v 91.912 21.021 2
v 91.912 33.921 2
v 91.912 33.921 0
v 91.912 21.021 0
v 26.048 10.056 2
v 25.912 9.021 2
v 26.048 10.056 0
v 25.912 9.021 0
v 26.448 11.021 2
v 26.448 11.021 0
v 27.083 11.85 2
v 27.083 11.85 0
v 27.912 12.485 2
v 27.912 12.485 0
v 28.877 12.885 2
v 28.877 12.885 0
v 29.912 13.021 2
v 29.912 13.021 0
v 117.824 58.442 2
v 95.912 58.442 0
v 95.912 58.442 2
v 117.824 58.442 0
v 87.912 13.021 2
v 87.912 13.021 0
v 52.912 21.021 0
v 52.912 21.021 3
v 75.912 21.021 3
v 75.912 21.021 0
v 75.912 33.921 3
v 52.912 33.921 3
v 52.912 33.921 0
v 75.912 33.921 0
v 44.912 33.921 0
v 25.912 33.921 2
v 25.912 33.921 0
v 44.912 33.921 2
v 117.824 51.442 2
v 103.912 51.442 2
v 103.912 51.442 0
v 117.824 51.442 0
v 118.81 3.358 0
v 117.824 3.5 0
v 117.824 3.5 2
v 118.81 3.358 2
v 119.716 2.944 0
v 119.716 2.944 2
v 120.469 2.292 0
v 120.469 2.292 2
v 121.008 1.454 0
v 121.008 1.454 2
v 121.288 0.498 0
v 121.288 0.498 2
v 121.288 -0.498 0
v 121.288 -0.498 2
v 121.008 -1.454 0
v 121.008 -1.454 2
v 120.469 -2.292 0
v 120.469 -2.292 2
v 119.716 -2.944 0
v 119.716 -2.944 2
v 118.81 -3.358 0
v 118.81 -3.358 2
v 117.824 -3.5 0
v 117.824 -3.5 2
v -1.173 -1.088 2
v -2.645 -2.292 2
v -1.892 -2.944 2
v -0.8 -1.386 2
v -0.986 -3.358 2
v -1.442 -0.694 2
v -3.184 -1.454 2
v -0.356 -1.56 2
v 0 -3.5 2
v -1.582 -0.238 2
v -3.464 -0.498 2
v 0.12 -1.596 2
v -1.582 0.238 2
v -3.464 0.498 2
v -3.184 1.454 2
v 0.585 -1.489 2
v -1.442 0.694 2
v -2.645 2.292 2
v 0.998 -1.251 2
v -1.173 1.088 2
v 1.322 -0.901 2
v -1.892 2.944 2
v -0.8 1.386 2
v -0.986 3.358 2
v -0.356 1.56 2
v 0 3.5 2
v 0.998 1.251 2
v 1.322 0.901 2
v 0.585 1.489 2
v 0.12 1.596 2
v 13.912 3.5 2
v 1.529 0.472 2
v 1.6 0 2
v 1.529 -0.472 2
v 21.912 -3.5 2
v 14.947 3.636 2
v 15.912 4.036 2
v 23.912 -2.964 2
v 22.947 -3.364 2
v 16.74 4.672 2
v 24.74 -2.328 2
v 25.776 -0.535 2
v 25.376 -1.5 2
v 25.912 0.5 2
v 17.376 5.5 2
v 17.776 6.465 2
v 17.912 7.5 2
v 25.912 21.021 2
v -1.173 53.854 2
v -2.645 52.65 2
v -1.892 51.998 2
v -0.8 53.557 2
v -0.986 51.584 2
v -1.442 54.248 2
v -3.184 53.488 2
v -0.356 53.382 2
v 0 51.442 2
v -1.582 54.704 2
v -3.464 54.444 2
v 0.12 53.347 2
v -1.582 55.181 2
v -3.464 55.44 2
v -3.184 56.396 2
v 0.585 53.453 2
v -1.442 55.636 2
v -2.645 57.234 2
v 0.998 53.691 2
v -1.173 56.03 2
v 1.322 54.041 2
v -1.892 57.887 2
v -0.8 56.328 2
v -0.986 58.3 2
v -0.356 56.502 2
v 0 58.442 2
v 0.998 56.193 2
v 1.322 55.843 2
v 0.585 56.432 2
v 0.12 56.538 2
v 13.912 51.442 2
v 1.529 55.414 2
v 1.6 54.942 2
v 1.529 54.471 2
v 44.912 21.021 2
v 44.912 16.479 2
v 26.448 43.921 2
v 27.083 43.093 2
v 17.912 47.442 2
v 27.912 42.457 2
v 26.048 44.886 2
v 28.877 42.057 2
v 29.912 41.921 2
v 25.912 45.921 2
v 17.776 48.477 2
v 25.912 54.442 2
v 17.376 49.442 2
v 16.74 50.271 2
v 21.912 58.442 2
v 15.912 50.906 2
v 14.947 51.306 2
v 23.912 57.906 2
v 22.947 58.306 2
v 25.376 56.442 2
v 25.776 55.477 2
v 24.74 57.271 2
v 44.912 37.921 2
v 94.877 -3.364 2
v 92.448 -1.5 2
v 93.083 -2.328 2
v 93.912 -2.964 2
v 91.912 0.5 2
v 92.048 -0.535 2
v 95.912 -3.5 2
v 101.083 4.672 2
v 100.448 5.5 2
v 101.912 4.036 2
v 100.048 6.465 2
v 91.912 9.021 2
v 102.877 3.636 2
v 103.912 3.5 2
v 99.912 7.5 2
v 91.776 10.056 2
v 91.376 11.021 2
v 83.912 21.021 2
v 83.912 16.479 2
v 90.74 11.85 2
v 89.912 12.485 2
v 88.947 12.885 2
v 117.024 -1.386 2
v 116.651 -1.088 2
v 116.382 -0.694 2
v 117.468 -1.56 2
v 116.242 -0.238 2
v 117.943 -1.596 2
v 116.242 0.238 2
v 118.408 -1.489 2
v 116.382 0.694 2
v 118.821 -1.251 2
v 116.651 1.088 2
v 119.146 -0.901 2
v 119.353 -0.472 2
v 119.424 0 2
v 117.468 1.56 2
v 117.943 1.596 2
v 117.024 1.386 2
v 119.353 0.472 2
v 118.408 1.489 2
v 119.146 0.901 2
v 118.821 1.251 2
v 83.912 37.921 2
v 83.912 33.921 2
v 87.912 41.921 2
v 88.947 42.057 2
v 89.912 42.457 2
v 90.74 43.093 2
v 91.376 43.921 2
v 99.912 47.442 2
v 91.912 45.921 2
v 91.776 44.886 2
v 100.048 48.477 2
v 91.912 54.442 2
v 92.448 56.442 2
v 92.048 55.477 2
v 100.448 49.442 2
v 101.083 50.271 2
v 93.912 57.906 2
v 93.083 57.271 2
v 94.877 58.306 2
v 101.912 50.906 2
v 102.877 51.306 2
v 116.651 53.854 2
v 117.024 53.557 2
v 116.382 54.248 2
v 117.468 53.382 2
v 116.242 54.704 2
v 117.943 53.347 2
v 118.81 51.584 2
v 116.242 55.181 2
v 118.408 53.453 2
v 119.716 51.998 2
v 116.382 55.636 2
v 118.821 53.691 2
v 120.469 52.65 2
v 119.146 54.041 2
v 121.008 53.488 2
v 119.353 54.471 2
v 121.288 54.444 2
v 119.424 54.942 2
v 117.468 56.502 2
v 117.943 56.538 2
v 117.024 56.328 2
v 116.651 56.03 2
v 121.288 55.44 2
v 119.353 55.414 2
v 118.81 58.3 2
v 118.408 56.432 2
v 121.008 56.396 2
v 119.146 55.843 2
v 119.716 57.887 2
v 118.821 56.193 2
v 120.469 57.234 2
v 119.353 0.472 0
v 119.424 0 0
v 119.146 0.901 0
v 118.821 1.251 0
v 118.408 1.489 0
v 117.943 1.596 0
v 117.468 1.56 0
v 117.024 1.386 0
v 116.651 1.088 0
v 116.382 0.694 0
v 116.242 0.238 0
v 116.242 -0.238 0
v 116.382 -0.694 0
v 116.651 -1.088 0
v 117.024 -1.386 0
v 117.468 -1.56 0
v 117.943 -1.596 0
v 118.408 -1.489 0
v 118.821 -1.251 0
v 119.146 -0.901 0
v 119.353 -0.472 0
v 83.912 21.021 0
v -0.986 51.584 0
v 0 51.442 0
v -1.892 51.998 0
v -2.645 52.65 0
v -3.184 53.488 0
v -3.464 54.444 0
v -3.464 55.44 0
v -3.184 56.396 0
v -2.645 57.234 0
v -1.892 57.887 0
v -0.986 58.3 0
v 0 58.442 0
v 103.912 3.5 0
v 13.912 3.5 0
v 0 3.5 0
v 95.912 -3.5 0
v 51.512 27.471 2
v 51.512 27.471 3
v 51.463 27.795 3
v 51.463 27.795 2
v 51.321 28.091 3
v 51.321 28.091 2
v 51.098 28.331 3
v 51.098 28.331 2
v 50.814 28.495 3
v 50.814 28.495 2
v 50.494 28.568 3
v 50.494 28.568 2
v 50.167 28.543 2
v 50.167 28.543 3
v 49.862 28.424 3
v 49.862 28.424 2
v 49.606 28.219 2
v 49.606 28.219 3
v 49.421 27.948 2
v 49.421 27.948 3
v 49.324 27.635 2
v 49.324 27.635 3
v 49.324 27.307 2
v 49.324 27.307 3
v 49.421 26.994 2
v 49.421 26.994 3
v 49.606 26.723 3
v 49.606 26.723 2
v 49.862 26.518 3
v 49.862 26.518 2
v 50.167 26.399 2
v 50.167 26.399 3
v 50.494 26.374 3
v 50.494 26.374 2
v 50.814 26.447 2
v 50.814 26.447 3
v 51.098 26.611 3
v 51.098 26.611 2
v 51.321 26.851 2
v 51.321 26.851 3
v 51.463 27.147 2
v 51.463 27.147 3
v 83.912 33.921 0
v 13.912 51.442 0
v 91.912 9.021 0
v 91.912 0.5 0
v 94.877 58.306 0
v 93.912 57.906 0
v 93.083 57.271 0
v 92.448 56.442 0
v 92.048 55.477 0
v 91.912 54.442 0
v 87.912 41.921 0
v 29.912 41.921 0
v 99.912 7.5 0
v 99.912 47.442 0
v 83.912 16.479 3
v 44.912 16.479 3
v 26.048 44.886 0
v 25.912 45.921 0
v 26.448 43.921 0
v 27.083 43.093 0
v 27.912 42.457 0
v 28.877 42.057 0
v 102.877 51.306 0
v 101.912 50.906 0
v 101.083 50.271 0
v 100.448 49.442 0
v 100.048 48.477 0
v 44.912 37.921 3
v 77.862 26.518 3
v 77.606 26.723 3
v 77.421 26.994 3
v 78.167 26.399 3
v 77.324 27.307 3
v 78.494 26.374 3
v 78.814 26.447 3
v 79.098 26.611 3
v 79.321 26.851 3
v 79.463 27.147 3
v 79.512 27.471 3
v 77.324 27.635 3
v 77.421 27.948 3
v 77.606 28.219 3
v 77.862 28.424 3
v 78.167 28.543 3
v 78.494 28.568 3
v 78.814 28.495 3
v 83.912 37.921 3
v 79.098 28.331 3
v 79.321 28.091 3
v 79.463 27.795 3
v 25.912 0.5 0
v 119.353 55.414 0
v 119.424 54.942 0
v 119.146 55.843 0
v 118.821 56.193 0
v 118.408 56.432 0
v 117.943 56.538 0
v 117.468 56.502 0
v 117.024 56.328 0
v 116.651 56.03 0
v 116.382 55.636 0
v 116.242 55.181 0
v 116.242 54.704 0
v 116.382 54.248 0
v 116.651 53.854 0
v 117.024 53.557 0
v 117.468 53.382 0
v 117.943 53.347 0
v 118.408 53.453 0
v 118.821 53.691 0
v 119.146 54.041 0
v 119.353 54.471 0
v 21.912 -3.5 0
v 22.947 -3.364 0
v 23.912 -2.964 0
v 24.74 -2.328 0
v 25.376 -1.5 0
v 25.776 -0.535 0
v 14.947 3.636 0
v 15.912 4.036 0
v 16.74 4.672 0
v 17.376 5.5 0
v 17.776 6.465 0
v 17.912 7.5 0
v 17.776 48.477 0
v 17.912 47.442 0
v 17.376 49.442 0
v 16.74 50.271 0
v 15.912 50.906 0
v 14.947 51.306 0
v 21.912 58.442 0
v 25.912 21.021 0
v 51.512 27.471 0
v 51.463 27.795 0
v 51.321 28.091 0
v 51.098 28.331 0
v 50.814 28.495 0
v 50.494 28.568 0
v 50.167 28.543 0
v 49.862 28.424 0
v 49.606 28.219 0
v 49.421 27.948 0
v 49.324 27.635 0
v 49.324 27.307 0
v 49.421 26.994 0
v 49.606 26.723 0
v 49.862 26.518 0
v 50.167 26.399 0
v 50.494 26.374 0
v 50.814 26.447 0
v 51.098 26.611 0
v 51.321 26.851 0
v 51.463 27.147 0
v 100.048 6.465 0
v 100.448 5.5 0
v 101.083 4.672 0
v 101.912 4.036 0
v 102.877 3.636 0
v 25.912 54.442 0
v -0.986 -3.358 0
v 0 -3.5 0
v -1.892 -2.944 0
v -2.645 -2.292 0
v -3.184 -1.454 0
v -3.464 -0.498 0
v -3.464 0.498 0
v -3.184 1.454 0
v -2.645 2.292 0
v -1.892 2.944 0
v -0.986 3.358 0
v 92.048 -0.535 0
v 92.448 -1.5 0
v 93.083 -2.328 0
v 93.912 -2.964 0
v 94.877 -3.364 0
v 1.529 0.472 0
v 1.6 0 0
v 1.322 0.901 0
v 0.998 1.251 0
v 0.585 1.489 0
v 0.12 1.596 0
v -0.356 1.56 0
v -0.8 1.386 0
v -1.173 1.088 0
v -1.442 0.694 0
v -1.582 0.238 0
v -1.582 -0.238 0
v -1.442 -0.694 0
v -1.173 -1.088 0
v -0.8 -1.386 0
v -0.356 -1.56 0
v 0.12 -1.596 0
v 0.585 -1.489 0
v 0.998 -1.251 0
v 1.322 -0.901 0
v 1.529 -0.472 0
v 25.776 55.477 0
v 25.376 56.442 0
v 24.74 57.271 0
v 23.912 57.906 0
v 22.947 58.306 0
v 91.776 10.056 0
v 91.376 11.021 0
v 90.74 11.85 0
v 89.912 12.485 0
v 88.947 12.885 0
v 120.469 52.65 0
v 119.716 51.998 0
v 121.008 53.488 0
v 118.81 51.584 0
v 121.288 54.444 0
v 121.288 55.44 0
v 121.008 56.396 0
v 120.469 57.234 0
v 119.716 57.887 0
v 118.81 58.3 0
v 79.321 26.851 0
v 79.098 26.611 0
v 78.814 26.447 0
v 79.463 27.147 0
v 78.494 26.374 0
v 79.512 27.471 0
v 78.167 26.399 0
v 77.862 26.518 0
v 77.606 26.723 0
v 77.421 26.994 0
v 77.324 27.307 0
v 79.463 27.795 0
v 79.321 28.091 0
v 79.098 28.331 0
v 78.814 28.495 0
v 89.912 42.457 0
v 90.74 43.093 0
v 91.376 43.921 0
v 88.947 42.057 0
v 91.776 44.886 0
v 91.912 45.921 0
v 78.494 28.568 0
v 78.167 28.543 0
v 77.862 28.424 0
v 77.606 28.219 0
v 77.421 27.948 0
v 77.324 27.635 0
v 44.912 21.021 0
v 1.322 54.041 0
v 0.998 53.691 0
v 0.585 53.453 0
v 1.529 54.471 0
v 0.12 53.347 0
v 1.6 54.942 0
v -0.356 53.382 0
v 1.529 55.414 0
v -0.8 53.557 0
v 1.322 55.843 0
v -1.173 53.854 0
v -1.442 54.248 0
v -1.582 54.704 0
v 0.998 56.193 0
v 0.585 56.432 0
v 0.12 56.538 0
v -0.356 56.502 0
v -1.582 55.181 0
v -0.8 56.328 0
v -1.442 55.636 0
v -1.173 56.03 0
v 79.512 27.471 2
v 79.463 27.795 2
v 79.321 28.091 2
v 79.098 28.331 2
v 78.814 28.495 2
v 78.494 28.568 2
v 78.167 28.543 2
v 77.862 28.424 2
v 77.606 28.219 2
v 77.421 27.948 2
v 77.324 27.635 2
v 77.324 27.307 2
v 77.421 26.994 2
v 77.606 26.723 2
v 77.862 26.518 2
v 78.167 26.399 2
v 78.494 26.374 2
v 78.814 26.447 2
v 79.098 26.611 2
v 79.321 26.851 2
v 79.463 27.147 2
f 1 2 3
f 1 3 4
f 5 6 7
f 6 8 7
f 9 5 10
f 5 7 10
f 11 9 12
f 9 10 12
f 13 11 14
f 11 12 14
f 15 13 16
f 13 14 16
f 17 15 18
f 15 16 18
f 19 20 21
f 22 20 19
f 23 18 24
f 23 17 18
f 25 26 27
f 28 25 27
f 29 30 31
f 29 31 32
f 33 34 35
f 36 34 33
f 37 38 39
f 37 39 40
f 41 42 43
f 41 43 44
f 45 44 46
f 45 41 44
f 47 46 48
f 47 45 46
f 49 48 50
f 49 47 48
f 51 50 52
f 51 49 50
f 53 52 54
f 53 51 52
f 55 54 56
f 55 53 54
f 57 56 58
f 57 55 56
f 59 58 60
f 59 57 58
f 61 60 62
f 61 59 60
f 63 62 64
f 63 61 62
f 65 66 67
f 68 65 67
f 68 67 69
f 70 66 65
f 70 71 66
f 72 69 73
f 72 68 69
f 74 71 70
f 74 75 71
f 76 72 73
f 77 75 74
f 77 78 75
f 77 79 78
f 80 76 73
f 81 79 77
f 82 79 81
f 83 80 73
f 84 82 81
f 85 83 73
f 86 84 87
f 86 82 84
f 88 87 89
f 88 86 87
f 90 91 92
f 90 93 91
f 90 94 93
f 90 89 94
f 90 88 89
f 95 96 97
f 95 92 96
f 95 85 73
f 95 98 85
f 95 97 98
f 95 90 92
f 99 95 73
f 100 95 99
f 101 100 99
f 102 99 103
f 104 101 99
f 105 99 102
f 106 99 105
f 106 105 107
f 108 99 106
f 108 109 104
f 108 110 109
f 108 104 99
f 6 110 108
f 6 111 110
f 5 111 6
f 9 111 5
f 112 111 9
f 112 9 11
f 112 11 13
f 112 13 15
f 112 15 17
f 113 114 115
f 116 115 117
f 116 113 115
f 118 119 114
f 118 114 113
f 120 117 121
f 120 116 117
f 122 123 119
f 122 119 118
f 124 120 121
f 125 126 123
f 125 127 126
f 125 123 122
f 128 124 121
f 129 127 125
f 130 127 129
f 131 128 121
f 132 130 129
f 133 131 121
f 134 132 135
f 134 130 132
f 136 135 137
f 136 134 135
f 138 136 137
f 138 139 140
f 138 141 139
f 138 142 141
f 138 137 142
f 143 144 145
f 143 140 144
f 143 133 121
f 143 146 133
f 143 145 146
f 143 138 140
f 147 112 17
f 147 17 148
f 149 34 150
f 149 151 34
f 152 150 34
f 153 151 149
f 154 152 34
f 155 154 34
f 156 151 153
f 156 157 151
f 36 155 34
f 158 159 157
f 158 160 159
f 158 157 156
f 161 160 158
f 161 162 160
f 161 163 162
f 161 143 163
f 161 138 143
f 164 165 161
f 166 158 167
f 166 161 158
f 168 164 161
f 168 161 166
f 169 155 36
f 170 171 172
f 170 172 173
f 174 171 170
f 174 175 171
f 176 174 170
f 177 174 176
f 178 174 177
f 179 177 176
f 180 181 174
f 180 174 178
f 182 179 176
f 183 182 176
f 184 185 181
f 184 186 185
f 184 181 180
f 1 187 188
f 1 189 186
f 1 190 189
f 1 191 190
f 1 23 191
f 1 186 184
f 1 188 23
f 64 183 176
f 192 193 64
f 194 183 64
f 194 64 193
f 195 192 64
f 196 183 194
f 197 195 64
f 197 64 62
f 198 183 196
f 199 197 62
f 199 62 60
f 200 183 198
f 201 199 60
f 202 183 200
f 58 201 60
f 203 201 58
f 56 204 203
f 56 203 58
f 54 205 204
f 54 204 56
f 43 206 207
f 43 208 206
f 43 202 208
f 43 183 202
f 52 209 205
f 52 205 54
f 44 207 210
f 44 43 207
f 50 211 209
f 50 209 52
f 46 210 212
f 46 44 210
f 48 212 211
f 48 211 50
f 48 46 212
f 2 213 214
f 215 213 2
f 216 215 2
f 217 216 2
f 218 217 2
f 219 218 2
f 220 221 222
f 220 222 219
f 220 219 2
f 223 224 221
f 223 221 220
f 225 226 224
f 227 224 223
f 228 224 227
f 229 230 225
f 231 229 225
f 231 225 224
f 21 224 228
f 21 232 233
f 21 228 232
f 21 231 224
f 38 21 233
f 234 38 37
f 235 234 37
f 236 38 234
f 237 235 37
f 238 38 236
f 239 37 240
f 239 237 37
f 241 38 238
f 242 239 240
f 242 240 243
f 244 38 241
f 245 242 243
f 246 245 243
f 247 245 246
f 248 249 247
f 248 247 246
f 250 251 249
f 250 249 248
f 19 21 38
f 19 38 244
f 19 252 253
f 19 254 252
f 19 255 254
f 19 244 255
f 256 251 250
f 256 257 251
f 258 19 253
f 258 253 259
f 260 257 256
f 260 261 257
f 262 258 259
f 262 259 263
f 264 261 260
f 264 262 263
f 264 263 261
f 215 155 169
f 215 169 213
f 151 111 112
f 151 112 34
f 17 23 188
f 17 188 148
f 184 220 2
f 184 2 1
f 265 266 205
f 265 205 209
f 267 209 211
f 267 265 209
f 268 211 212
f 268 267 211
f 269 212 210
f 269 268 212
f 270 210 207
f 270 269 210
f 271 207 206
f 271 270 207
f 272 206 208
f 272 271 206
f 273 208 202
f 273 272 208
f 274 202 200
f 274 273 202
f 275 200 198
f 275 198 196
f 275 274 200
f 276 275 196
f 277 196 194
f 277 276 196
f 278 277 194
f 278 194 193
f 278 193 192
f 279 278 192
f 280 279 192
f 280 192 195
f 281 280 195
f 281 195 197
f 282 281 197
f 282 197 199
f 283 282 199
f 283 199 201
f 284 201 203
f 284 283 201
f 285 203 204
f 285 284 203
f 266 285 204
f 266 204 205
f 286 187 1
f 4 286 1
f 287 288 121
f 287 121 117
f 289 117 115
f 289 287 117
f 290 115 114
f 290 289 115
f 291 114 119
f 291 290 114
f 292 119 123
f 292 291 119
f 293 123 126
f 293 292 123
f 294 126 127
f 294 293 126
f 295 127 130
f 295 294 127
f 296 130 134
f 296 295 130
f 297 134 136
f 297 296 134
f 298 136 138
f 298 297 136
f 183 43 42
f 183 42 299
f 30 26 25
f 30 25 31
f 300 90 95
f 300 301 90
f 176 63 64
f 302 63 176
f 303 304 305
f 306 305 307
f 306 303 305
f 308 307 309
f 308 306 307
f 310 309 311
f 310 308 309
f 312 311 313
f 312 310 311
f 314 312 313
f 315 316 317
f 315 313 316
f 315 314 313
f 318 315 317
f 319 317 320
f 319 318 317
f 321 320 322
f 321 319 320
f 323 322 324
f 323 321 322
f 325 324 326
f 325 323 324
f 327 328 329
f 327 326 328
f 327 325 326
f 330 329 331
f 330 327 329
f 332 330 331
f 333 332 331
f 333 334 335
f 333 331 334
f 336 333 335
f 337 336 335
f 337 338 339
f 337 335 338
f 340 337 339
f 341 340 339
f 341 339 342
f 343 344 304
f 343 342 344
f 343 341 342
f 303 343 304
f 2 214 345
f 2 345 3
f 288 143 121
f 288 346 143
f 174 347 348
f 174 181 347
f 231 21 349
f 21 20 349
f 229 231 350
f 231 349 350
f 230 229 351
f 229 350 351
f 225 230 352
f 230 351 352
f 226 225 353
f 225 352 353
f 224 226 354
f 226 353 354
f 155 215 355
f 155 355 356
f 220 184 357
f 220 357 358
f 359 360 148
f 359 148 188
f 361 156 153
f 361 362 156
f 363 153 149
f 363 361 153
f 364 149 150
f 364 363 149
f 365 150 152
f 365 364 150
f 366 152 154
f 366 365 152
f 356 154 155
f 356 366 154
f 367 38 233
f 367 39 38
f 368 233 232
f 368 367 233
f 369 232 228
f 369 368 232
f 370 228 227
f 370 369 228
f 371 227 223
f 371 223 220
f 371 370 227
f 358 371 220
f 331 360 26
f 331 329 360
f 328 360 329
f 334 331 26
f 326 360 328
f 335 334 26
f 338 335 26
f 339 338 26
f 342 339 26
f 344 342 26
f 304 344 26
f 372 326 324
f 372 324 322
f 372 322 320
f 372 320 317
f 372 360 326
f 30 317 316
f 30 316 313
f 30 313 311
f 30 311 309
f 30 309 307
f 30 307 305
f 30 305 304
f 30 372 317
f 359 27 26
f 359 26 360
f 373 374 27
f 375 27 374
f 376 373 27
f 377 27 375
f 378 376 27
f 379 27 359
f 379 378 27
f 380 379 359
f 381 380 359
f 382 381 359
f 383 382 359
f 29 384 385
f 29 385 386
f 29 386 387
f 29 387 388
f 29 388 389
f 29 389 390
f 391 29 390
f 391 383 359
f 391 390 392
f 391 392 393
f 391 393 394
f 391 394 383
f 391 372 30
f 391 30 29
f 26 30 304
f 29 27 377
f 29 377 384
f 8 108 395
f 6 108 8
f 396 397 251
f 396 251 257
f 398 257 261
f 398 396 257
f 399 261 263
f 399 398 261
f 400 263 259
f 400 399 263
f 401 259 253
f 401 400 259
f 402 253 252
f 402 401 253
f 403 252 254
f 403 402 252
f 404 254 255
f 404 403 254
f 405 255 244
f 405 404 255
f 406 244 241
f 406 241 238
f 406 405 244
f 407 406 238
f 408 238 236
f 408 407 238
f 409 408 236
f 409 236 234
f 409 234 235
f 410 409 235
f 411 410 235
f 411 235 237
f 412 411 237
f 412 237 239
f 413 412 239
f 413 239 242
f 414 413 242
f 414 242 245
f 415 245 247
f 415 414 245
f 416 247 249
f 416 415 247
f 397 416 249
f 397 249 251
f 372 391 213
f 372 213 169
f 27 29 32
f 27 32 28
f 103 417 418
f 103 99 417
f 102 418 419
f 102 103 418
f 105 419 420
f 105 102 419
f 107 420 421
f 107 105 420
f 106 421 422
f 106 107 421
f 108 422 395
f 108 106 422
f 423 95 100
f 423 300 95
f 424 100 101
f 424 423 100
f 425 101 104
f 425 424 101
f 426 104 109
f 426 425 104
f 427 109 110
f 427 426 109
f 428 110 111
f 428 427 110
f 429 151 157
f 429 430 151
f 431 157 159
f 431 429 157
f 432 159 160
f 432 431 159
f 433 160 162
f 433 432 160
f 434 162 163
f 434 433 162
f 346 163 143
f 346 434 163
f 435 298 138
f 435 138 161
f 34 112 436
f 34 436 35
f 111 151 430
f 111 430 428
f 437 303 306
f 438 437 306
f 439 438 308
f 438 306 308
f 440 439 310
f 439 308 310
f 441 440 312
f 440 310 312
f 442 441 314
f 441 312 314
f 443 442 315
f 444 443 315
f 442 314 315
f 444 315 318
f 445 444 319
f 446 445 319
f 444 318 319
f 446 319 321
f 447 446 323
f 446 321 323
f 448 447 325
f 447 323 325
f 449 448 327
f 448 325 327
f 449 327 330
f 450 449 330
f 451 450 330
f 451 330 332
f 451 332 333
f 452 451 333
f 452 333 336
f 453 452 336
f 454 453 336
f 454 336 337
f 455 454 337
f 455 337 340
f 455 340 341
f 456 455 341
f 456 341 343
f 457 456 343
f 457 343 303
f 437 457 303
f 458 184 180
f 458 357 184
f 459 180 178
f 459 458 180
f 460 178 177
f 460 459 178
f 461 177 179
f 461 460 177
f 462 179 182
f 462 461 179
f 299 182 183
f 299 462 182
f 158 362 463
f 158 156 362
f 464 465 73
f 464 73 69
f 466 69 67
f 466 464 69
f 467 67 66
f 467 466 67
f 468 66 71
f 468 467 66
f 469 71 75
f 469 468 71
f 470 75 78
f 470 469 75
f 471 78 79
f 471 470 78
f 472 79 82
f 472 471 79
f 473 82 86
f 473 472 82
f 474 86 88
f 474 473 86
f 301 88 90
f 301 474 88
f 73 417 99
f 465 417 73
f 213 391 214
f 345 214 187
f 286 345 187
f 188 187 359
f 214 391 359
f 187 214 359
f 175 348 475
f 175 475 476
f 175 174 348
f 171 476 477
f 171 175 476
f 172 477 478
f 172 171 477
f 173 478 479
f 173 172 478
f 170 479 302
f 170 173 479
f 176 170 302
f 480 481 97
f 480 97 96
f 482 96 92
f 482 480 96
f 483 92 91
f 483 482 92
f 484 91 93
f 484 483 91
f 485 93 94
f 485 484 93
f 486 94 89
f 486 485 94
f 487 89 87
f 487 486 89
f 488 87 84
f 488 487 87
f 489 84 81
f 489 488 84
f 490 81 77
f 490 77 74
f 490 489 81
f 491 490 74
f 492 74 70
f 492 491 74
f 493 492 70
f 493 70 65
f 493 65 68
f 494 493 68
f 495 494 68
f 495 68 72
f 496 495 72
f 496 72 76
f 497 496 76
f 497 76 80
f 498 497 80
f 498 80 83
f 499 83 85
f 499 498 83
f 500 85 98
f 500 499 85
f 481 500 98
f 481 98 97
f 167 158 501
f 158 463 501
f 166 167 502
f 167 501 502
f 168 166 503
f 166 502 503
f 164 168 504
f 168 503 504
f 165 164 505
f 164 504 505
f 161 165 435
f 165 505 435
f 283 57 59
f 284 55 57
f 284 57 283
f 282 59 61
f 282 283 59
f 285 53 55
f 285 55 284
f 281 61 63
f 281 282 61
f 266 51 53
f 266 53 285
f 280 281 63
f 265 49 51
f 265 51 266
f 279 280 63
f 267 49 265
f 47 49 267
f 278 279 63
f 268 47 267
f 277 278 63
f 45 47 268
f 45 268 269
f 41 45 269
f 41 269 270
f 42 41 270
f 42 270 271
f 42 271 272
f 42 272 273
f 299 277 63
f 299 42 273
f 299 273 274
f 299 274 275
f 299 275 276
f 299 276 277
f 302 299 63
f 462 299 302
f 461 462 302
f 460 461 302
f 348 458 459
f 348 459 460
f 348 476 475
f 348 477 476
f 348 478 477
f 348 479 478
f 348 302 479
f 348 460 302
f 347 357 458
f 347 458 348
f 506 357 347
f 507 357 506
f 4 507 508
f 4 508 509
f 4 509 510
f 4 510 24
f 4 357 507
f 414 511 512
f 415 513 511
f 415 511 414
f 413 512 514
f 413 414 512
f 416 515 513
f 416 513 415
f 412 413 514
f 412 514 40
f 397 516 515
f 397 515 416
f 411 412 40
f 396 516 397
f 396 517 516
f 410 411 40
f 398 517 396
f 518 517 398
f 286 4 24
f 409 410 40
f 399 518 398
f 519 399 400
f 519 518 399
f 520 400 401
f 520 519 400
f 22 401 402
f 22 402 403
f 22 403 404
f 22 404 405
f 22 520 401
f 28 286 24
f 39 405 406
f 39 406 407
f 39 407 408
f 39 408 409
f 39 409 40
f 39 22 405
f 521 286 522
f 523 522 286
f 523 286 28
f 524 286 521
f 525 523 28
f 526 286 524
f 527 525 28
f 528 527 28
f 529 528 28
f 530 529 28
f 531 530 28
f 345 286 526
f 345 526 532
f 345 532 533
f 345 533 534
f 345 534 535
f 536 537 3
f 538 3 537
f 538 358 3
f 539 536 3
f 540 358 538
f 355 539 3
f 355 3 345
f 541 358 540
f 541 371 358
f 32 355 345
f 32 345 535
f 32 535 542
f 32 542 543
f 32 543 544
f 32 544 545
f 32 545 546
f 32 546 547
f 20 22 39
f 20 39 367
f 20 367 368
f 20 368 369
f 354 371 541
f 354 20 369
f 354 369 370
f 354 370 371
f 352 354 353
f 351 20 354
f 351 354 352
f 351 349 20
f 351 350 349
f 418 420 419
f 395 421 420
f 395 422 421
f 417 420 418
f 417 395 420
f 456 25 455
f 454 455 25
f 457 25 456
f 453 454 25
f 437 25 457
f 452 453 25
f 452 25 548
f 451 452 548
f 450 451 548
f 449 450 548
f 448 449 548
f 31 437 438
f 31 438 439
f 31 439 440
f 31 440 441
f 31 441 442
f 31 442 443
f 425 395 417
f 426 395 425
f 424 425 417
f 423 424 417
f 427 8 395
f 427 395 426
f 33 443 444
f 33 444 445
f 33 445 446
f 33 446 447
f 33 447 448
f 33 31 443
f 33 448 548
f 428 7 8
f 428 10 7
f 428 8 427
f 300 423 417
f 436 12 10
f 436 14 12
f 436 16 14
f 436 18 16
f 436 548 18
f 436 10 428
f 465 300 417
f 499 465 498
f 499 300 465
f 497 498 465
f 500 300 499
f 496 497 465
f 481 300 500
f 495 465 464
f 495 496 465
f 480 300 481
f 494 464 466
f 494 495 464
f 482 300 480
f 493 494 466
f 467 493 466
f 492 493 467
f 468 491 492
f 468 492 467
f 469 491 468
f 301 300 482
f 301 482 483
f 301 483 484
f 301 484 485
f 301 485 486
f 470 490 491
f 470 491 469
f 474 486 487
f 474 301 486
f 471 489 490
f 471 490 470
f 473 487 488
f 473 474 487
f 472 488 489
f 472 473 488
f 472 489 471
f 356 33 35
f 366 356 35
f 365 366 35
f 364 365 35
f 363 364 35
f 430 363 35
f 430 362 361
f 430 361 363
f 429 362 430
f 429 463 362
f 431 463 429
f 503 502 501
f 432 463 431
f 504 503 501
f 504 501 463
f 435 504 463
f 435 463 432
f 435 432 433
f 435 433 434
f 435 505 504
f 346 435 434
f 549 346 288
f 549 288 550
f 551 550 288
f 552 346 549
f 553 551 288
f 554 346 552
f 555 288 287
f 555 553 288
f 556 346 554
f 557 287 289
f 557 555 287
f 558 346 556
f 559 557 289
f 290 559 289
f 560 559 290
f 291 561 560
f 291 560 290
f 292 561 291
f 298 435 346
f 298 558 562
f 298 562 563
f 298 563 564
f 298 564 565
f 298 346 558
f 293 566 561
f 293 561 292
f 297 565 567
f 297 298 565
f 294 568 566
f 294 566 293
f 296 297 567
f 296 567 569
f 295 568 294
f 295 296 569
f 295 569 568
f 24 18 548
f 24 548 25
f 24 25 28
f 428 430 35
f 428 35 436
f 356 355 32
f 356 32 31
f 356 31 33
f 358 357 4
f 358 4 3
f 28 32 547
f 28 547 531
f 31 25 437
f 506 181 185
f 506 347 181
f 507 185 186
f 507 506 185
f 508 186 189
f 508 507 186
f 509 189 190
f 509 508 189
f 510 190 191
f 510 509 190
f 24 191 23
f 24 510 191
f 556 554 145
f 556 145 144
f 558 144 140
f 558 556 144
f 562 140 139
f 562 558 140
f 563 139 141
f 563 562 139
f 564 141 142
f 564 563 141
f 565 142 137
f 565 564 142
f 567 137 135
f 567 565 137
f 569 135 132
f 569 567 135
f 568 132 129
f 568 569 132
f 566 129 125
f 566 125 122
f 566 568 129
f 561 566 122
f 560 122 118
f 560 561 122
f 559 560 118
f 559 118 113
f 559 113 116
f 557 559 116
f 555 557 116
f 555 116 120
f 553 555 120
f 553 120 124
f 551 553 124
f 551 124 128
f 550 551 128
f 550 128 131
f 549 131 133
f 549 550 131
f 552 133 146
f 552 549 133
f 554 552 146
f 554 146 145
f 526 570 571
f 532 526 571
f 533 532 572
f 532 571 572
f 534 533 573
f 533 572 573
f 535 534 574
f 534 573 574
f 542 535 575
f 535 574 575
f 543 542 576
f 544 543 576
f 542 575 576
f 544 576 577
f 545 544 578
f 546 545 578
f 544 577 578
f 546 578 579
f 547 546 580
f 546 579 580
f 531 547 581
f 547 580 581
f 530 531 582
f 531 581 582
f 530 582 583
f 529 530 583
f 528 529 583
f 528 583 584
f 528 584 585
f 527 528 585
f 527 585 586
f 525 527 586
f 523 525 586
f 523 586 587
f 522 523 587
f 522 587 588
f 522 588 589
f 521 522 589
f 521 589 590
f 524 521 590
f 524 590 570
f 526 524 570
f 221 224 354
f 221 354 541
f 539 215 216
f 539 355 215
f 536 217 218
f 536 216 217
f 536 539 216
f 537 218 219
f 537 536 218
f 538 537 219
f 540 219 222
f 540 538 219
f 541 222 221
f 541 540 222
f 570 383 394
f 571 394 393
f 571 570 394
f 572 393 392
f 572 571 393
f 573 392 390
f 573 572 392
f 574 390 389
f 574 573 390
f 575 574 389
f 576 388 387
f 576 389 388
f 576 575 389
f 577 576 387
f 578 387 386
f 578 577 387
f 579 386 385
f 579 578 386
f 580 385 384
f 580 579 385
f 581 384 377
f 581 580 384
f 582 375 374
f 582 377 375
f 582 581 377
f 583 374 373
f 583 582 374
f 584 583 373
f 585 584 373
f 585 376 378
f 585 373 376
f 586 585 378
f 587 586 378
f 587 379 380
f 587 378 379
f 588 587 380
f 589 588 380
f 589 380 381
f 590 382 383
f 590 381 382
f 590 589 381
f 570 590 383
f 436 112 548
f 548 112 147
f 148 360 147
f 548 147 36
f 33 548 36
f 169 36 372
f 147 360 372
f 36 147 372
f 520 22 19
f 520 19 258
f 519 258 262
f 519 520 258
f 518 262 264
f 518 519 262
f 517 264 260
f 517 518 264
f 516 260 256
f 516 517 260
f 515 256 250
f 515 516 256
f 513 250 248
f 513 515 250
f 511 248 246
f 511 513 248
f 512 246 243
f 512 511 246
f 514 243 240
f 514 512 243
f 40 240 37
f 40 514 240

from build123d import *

# Parameters (mm, degrees)
SKETCH1_R                = 1.6
SKETCH1_R_2              = 2.1
BOSS_EXTRUDE3_DEPTH      = 2
BOSS_EXTRUDE4_DEPTH      = 2
SKETCH4_W                = 66
SKETCH4_H                = 16.340111315
SKETCH4_H_2              = 24.741581589
CUT_EXTRUDE3_DEPTH       = 14.5
FILLET1_R                = 4
SKETCH5_W                = 26
SKETCH5_H                = 27
SKETCH5_R                = 6
BOSS_EXTRUDE5_DEPTH      = 2
SKETCH6_W                = 5
SKETCH6_H                = 27
CUT_EXTRUDE4_DEPTH       = 14.5
SKETCH7_R                = 2.5
BOSS_EXTRUDE6_DEPTH      = 2
SKETCH8_R                = 2.5
CUT_EXTRUDE5_DEPTH       = 10
SKETCH9_W                = 22.081
SKETCH9_H                = 27
CUT_EXTRUDE6_DEPTH       = 10
CUT_EXTRUDE7_DEPTH       = 10
SKETCH11_W               = 28.061
SKETCH11_H               = 7.05
BOSS_EXTRUDE7_DEPTH      = 2
SKETCH12_W               = 44.061
SKETCH12_H               = 28.9
CUT_EXTRUDE9_DEPTH       = 10
BOSS_EXTRUDE9_DEPTH      = 2
FILLET2_R                = 4
SKETCH14_R               = 2.5
SKETCH14_W               = 28.061
SKETCH14_H               = 12.9
BOSS_EXTRUDE10_DEPTH     = 1
SKETCH15_W               = 3
SKETCH15_H               = 12.9
BOSS_EXTRUDE11_DEPTH     = 2.5
SKETCH16_W               = 3
SKETCH16_H               = 12.9
BOSS_EXTRUDE12_DEPTH     = 2.5
SKETCH17_W               = 6
SKETCH17_H               = 12.9
CUT_EXTRUDE12_DEPTH      = 5.5
BOSS_EXTRUDE13_DEPTH     = 3
CUT_EXTRUDE13_DEPTH      = 1
SKETCH21_W               = 0.081
SKETCH21_H               = 12.9
SKETCH21_W_2             = 4.98
CUT_EXTRUDE14_DEPTH      = 5.5
SKETCH22_R               = 2.5
BOSS_EXTRUDE14_DEPTH     = 3
SKETCH23_R               = 1.1
CUT_EXTRUDE17_DEPTH      = 5.5
CUT_EXTRUDE17_DEPTH_BACK = 5.5


with BuildPart() as part:
    # Sketch1 → Boss-Extrude3 (new body)
    with BuildSketch(Plane.XY):
        with BuildLine():
            Line((0, 3.5), (37.911912125, 3.5))
            Line((37.911912125, 3.5), (37.911912125, 13.97107578))
            Line((37.911912125, 13.97107578), (37.911912125, 40.97107578))
            Line((37.911912125, 40.97107578), (37.911912125, 51.44215156))
            Line((37.911912125, 51.44215156), (0, 51.44215156))
            ThreePointArc((0, 51.44215156), (-3.5, 54.94215156), (0, 58.44215156))
            Line((0, 58.44215156), (45.911912125, 58.44215156))
            Line((45.911912125, 58.44215156), (45.911912125, 51.44215156))
            Line((45.911912125, 51.44215156), (45.911912125, 48.97107578))
            Line((45.911912125, 48.97107578), (50.911912125, 48.97107578))
            Line((50.911912125, 48.97107578), (66.911912125, 48.97107578))
            Line((66.911912125, 48.97107578), (71.911912125, 48.97107578))
            Line((71.911912125, 48.97107578), (71.911912125, 51.44215156))
            Line((71.911912125, 51.44215156), (71.911912125, 58.44215156))
            Line((71.911912125, 58.44215156), (117.82382425, 58.44215156))
            ThreePointArc((117.82382425, 58.44215156), (121.32382425, 54.94215156), (117.82382425, 51.44215156))
            Line((117.82382425, 51.44215156), (79.911912125, 51.44215156))
            Line((79.911912125, 51.44215156), (79.911912125, 40.97107578))
            Line((79.911912125, 40.97107578), (79.911912125, 13.97107578))
            Line((79.911912125, 13.97107578), (79.911912125, 3.5))
            Line((79.911912125, 3.5), (117.82382425, 3.5))
            ThreePointArc((117.82382425, 3.5), (121.32382425, 0), (117.82382425, -3.5))
            Line((117.82382425, -3.5), (71.911912125, -3.5))
            Line((71.911912125, -3.5), (71.911912125, 3.5))
            Line((71.911912125, 3.5), (71.911912125, 5.97107578))
            Line((71.911912125, 5.97107578), (66.911912125, 5.97107578))
            Line((66.911912125, 5.97107578), (50.911912125, 5.97107578))
            Line((50.911912125, 5.97107578), (45.911912125, 5.97107578))
            Line((45.911912125, 5.97107578), (45.911912125, 3.5))
            Line((45.911912125, 3.5), (45.911912125, -3.5))
            Line((45.911912125, -3.5), (0, -3.5))
            ThreePointArc((0, -3.5), (-3.5, 0), (0, 3.5))
        make_face()
        with Locations((0, 54.94215156)):
            Circle(SKETCH1_R, mode=Mode.SUBTRACT)
        with Locations((117.82382425, 54.94215156)):
            Circle(SKETCH1_R, mode=Mode.SUBTRACT)
        with Locations((117.82382425, 0)):
            Circle(SKETCH1_R, mode=Mode.SUBTRACT)
        Circle(SKETCH1_R, mode=Mode.SUBTRACT)
        with Locations((66.911912125, 44.97107578)):
            Circle(SKETCH1_R_2, mode=Mode.SUBTRACT)
        with Locations((66.911912125, 9.97107578)):
            Circle(SKETCH1_R_2, mode=Mode.SUBTRACT)
        with Locations((50.911912125, 9.97107578)):
            Circle(SKETCH1_R_2, mode=Mode.SUBTRACT)
        with Locations((50.911912125, 44.97107578)):
            Circle(SKETCH1_R_2, mode=Mode.SUBTRACT)
        Polygon((66.911912125, 40.97107578), (50.911912125, 40.97107578), (45.911912125, 40.97107578), (45.911912125, 27.47107578), (45.911912125, 13.97107578), (50.911912125, 13.97107578), (66.911912125, 13.97107578), (71.911912125, 13.97107578), (71.911912125, 27.47107578), (71.911912125, 40.97107578), align=None, mode=Mode.SUBTRACT)
    extrude(amount=BOSS_EXTRUDE3_DEPTH)

    # Sketch3 → Boss-Extrude4 (add)
    with BuildSketch(Plane.XY.offset(2)):
        Polygon((71.911912125, 13.97107578), (99.911912125, 13.97107578), (99.911912125, 3.5), (91.911912125, 3.5), (91.911912125, 5.97107578), (71.911912125, 5.97107578), align=None)
        Polygon((91.911912125, 51.44215156), (99.911912125, 51.44215156), (99.911912125, 40.97107578), (71.911912125, 40.97107578), (71.911912125, 48.97107578), (91.911912125, 48.97107578), align=None)
        Polygon((45.911912125, 40.97107578), (17.911912125, 40.97107578), (17.911912125, 51.44215156), (25.911912125, 51.44215156), (25.911912125, 48.97107578), (45.911912125, 48.97107578), align=None)
        Polygon((25.911912125, 3.5), (17.911912125, 3.5), (17.911912125, 13.97107578), (45.911912125, 13.97107578), (45.911912125, 5.97107578), (25.911912125, 5.97107578), align=None)
    extrude(amount=-BOSS_EXTRUDE4_DEPTH)

    # Sketch4 → Cut-Extrude3 (cut)
    with BuildSketch(Plane.XY.offset(2)):
        with Locations((58.911912125, 57.141131438)):
            Rectangle(SKETCH4_W, SKETCH4_H)
        with Locations((58.911912125, -6.399715014)):
            Rectangle(SKETCH4_W, SKETCH4_H_2)
    extrude(amount=-CUT_EXTRUDE3_DEPTH, mode=Mode.SUBTRACT)

    # Fillet1
    fillet1_edges = [part.edges().sort_by_distance(p)[0] for p in [
        (99.911912125, 13.97107578, 1),
        (99.911912125, 3.5, 1),
        (91.911912125, 5.97107578, 1),
        (91.911912125, 48.97107578, 1),
        (99.911912125, 51.44215156, 1),
        (99.911912125, 40.97107578, 1),
        (17.911912125, 40.97107578, 1),
        (17.911912125, 51.44215156, 1),
        (25.911912125, 48.97107578, 1),
        (25.911912125, 5.97107578, 1),
        (17.911912125, 3.5, 1),
        (17.911912125, 13.97107578, 1),
        (91.911912125, 58.44215156, 1),
        (25.911912125, 58.44215156, 1),
        (91.911912125, -3.5, 1),
        (25.911912125, -3.5, 1),
    ]]
    fillet(fillet1_edges, radius=FILLET1_R)

    # Sketch5 → Boss-Extrude5 (add)
    with BuildSketch(Plane.XY.offset(2)):
        with Locations((58.911912125, 27.47107578)):
            Rectangle(SKETCH5_W, SKETCH5_H)
        with Locations((58.911912125, 27.47107578)):
            Circle(SKETCH5_R, mode=Mode.SUBTRACT)
    extrude(amount=-BOSS_EXTRUDE5_DEPTH)

    # Sketch6 → Cut-Extrude4 (cut)
    with BuildSketch(Plane.XY.offset(2)):
        with Locations((40.411912125, 27.47107578)):
            Rectangle(SKETCH6_W, SKETCH6_H)
        with Locations((77.411912125, 27.47107578)):
            Rectangle(SKETCH6_W, SKETCH6_H)
    extrude(amount=-CUT_EXTRUDE4_DEPTH, mode=Mode.SUBTRACT)

    # Sketch7 → Boss-Extrude6 (add)
    with BuildSketch(Plane.XY.offset(2)):
        Polygon((80.891912125, 27.47107578), (80.891912125, 40.97107578), (88.891912125, 40.97107578), (88.891912125, 27.47107578), (88.891912125, 13.97107578), (80.891912125, 13.97107578), align=None)
        with Locations((84.891912125, 27.47107578)):
            Circle(SKETCH7_R, mode=Mode.SUBTRACT)
    extrude(amount=-BOSS_EXTRUDE6_DEPTH)

    # Sketch8 → Cut-Extrude5 (cut)
    with BuildSketch(Plane.XY.offset(2)):
        with Locations((48.830912125, 27.47107578)):
            Circle(SKETCH8_R)
    extrude(amount=-CUT_EXTRUDE5_DEPTH, mode=Mode.SUBTRACT)

    # Sketch9 → Cut-Extrude6 (cut)
    with BuildSketch(Plane.XY.offset(2)):
        Polygon((42.911912125, 40.97107578), (44.830912125, 40.97107578), (44.830912125, 27.47107578), (44.830912125, 13.97107578), (42.911912125, 13.97107578), align=None)
        with Locations((63.871412125, 27.47107578)):
            Rectangle(SKETCH9_W, SKETCH9_H)
    extrude(amount=-CUT_EXTRUDE6_DEPTH, mode=Mode.SUBTRACT)

    # Sketch10 → Cut-Extrude7 (cut)
    with BuildSketch(Plane.XY.offset(2)):
        Polygon((44.830912125, 13.97107578), (44.830912125, 13.02107578), (88.891912125, 13.02107578), (88.891912125, 13.97107578), (106.020559472, 13.97107578), (106.020559472, 3.5), (12.964535502, 3.5), (12.964535502, 13.97107578), align=None)
        Polygon((88.891912125, 40.97107578), (88.891912125, 41.92107578), (44.830912125, 41.92107578), (44.830912125, 40.97107578), (12.964535502, 40.97107578), (12.964535502, 51.44215156), (106.020559472, 51.44215156), (106.020559472, 40.97107578), align=None)
    extrude(amount=-CUT_EXTRUDE7_DEPTH, mode=Mode.SUBTRACT)

    # Sketch11 → Boss-Extrude7 (add)
    with BuildSketch(Plane.XY.offset(2)):
        with Locations((66.861412125, 37.44607578)):
            Rectangle(SKETCH11_W, SKETCH11_H)
        with Locations((66.861412125, 17.49607578)):
            Rectangle(SKETCH11_W, SKETCH11_H)
    extrude(amount=-BOSS_EXTRUDE7_DEPTH)

    # Sketch12 → Cut-Extrude9 (cut)
    with BuildSketch(Plane.XY.offset(2)):
        Polygon((25.911912125, 1.23553789), (25.911912125, 54.44215156), (91.911912125, 54.44215156), (91.911912125, 0.5), align=None)
        with Locations((66.861412125, 27.47107578)):
            Rectangle(SKETCH12_W, SKETCH12_H, mode=Mode.SUBTRACT)
    extrude(amount=-CUT_EXTRUDE9_DEPTH, mode=Mode.SUBTRACT)

    # Sketch13 → Boss-Extrude9 (add)
    with BuildSketch(Plane.XY.offset(2)):
        Polygon((17.911912125, 3.5), (25.911912125, 3.5), (25.911912125, 13.02107578), (44.830912125, 13.02107578), (44.830912125, 21.02107578), (25.911912125, 21.02107578), (25.911912125, 33.92107578), (44.830912125, 33.92107578), (44.830912125, 41.92107578), (25.911912125, 41.92107578), (25.911912125, 51.44215156), (17.911912125, 51.44215156), (17.911912125, 13.02107578), align=None)
        Polygon((99.911912125, 51.44215156), (91.911912125, 51.44215156), (91.911912125, 41.92107578), (88.891912125, 41.92107578), (88.891912125, 33.92107578), (91.911912125, 33.92107578), (91.911912125, 21.02107578), (88.891912125, 21.02107578), (88.891912125, 13.02107578), (91.911912125, 13.02107578), (91.911912125, 3.5), (99.911912125, 3.5), (99.911912125, 41.92107578), align=None)
    extrude(amount=-BOSS_EXTRUDE9_DEPTH)

    # Fillet2
    fillet2_edges = [part.edges().sort_by_distance(p)[0] for p in [
        (99.911912125, 51.44215156, 1),
        (99.911912125, 3.5, 1),
        (91.911912125, 13.02107578, 1),
        (91.911912125, 41.92107578, 1),
        (25.911912125, 13.02107578, 1),
        (17.911912125, 3.5, 1),
        (17.911912125, 51.44215156, 1),
        (25.911912125, 41.92107578, 1),
    ]]
    fillet(fillet2_edges, radius=FILLET2_R)

    # Sketch14 → Boss-Extrude10 (add)
    with BuildSketch(Plane.XY.offset(2)):
        Polygon((44.830912125, 33.92107578), (44.830912125, 37.92107578), (88.891912125, 37.92107578), (88.891912125, 33.92107578), (88.891912125, 21.02107578), (88.891912125, 16.479152283), (44.830912125, 16.479152283), (44.830912125, 21.02107578), align=None)
        with Locations((48.830912125, 27.47107578)):
            Circle(SKETCH14_R, mode=Mode.SUBTRACT)
        with Locations((84.891912125, 27.47107578)):
            Circle(SKETCH14_R, mode=Mode.SUBTRACT)
        with Locations((66.861412125, 27.47107578)):
            Rectangle(SKETCH14_W, SKETCH14_H, mode=Mode.SUBTRACT)
    extrude(amount=BOSS_EXTRUDE10_DEPTH)

    # Sketch15 → Boss-Extrude11 (add)
    with BuildSketch(Plane(origin=(52.830912125, 0, 0), x_dir=(0, 0, -1), z_dir=(1, 0, 0))):
        with Locations((-1.5, 27.47107578)):
            Rectangle(SKETCH15_W, SKETCH15_H)
    extrude(amount=BOSS_EXTRUDE11_DEPTH)

    # Sketch16 → Boss-Extrude12 (add)
    with BuildSketch(Plane.ZY.offset(-80.891912125)):
        with Locations((1.5, 27.47107578)):
            Rectangle(SKETCH16_W, SKETCH16_H)
    extrude(amount=BOSS_EXTRUDE12_DEPTH)

    # Sketch17 → Cut-Extrude12 (cut)
    with BuildSketch(Plane.XY.offset(3)):
        with Locations((55.911912125, 27.47107578)):
            Rectangle(SKETCH17_W, SKETCH17_H)
    extrude(amount=-CUT_EXTRUDE12_DEPTH, mode=Mode.SUBTRACT)

    # Sketch19 → Boss-Extrude13 (add)
    with BuildSketch(Plane.XY.offset(3)):
        Polygon((75.911912125, 27.47107578), (75.911912125, 33.92107578), (78.391912125, 33.92107578), (78.391912125, 21.02107578), (75.911912125, 21.02107578), align=None)
    extrude(amount=-BOSS_EXTRUDE13_DEPTH)

    # Sketch20 → Cut-Extrude13 (cut)
    with BuildSketch(Plane.XY.offset(3)):
        Polygon((37.503218373, 44.973204348), (36.040097649, -4.597325781), (97.140019083, -2.256332623), (103.870374413, 35.726281372), (82.918485646, 46.904523704), align=None)
        Polygon((83.911912125, 27.47107578), (83.911912125, 37.92107578), (44.911912125, 37.92107578), (44.911912125, 27.47107578), (44.911912125, 16.479152283), (83.911912125, 16.479152283), align=None, mode=Mode.SUBTRACT)
    extrude(amount=-CUT_EXTRUDE13_DEPTH, mode=Mode.SUBTRACT)

    # Sketch21 → Cut-Extrude14 (cut)
    with BuildSketch(Plane.XY.offset(2)):
        with Locations((44.871412125, 27.47107578)):
            Rectangle(SKETCH21_W, SKETCH21_H)
        with Locations((86.401912125, 27.47107578)):
            Rectangle(SKETCH21_W_2, SKETCH21_H)
    extrude(amount=-CUT_EXTRUDE14_DEPTH, mode=Mode.SUBTRACT)

    # Sketch22 → Boss-Extrude14 (add)
    with BuildSketch(Plane.XY.offset(3)):
        with Locations((48.830912125, 27.47107578)):
            Circle(SKETCH22_R)
        Polygon((83.911912125, 25.171162738), (83.911912125, 29.770988822), (78.292126648, 33.292249077), (79.181354054, 24.086130054), align=None)
    extrude(amount=-BOSS_EXTRUDE14_DEPTH)

    # Sketch23 → Cut-Extrude17 (cut, two sides)
    with BuildSketch(Plane.XY.offset(2)) as cut_extrude17_sk:
        with Locations((50.411912125, 27.47107578)):
            Circle(SKETCH23_R)
        with Locations((78.411912125, 27.47107578)):
            Circle(SKETCH23_R)
    extrude(amount=CUT_EXTRUDE17_DEPTH, mode=Mode.SUBTRACT)
    extrude(cut_extrude17_sk.sketch, amount=-CUT_EXTRUDE17_DEPTH_BACK, mode=Mode.SUBTRACT)


solid = part.part
